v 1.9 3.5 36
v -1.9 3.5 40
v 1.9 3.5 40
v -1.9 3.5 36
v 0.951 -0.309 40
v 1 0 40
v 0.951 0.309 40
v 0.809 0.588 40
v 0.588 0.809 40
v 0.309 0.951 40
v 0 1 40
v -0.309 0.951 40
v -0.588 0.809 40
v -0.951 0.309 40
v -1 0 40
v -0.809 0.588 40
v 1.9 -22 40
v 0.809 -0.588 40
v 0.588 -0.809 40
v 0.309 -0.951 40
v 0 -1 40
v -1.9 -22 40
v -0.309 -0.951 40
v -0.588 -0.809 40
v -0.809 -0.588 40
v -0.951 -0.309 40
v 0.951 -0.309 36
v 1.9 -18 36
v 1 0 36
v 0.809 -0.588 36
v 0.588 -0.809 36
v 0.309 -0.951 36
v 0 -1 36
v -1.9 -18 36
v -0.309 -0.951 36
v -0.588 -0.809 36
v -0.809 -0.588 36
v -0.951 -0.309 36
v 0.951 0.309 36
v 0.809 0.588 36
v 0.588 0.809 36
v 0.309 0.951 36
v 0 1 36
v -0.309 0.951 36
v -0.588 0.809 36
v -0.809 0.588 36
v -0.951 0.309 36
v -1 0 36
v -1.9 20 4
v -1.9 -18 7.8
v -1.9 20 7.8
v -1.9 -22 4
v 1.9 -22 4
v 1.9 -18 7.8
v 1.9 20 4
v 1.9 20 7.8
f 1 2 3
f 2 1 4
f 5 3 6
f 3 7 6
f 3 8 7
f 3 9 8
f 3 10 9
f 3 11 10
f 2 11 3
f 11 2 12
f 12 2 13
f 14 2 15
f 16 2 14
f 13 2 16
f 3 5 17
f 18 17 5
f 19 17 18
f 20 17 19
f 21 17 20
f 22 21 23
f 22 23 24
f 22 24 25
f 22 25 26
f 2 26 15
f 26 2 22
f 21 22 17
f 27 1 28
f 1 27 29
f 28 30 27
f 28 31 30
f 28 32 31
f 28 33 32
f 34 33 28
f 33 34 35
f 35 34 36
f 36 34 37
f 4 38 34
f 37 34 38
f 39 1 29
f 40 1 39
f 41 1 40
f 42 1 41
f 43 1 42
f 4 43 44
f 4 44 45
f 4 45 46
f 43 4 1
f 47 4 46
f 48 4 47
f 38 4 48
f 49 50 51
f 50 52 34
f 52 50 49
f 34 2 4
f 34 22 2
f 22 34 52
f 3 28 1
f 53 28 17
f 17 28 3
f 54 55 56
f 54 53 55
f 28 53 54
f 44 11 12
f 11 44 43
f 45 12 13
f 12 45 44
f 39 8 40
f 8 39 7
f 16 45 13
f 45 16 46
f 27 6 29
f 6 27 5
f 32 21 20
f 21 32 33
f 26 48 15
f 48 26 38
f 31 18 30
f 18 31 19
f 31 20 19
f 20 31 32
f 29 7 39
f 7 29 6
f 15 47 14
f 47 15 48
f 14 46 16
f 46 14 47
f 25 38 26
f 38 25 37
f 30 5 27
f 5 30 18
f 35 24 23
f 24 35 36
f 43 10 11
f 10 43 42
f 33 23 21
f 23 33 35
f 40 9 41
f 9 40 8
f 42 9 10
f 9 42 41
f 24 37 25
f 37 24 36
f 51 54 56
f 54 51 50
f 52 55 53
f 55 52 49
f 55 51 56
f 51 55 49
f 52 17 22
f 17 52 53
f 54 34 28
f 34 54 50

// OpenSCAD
// This is a simple implementation of an impossible table.


module plate() {
    thickness = 4;
    difference() {
        cylinder(r=25, h=thickness);
        translate([23, 0, 0]) cylinder(r=1, h=5, $fn=20);
        rotate([0, 0, 120]) translate([23, 0, 0]) cylinder(r=1, h=5, $fn=20);
        rotate([0, 0, -120]) translate([23, 0, 0]) cylinder(r=1, h=5, $fn=20);
    }
    rotate([0, 0, 90]) translate([0, 0, 6]) difference() {
        cube([10, 8, 8], center=true);
        cube([10, 4, 4], center=true);
    }
}

module leg() {
    rotate([0, 0, 90]) translate([0, 0, 5.9]) cube([40, 3.8, 3.8], center=true);
    rotate([0, 0, 90]) translate([-20, 0, 22]) cube([4, 3.8, 36], center=true);
    rotate([0, 0, 90]) translate([-9, 0, 38]) difference() {
        cube([25, 3.8, 4], center=true);
        translate([9, 0, -2]) cylinder(r=1, h=4, $fn=20);
    }

}

leg();
/*
plate();
translate([0, 0, 60]) rotate([180, 0, 0]) {
    plate();
    leg();
}
*/
